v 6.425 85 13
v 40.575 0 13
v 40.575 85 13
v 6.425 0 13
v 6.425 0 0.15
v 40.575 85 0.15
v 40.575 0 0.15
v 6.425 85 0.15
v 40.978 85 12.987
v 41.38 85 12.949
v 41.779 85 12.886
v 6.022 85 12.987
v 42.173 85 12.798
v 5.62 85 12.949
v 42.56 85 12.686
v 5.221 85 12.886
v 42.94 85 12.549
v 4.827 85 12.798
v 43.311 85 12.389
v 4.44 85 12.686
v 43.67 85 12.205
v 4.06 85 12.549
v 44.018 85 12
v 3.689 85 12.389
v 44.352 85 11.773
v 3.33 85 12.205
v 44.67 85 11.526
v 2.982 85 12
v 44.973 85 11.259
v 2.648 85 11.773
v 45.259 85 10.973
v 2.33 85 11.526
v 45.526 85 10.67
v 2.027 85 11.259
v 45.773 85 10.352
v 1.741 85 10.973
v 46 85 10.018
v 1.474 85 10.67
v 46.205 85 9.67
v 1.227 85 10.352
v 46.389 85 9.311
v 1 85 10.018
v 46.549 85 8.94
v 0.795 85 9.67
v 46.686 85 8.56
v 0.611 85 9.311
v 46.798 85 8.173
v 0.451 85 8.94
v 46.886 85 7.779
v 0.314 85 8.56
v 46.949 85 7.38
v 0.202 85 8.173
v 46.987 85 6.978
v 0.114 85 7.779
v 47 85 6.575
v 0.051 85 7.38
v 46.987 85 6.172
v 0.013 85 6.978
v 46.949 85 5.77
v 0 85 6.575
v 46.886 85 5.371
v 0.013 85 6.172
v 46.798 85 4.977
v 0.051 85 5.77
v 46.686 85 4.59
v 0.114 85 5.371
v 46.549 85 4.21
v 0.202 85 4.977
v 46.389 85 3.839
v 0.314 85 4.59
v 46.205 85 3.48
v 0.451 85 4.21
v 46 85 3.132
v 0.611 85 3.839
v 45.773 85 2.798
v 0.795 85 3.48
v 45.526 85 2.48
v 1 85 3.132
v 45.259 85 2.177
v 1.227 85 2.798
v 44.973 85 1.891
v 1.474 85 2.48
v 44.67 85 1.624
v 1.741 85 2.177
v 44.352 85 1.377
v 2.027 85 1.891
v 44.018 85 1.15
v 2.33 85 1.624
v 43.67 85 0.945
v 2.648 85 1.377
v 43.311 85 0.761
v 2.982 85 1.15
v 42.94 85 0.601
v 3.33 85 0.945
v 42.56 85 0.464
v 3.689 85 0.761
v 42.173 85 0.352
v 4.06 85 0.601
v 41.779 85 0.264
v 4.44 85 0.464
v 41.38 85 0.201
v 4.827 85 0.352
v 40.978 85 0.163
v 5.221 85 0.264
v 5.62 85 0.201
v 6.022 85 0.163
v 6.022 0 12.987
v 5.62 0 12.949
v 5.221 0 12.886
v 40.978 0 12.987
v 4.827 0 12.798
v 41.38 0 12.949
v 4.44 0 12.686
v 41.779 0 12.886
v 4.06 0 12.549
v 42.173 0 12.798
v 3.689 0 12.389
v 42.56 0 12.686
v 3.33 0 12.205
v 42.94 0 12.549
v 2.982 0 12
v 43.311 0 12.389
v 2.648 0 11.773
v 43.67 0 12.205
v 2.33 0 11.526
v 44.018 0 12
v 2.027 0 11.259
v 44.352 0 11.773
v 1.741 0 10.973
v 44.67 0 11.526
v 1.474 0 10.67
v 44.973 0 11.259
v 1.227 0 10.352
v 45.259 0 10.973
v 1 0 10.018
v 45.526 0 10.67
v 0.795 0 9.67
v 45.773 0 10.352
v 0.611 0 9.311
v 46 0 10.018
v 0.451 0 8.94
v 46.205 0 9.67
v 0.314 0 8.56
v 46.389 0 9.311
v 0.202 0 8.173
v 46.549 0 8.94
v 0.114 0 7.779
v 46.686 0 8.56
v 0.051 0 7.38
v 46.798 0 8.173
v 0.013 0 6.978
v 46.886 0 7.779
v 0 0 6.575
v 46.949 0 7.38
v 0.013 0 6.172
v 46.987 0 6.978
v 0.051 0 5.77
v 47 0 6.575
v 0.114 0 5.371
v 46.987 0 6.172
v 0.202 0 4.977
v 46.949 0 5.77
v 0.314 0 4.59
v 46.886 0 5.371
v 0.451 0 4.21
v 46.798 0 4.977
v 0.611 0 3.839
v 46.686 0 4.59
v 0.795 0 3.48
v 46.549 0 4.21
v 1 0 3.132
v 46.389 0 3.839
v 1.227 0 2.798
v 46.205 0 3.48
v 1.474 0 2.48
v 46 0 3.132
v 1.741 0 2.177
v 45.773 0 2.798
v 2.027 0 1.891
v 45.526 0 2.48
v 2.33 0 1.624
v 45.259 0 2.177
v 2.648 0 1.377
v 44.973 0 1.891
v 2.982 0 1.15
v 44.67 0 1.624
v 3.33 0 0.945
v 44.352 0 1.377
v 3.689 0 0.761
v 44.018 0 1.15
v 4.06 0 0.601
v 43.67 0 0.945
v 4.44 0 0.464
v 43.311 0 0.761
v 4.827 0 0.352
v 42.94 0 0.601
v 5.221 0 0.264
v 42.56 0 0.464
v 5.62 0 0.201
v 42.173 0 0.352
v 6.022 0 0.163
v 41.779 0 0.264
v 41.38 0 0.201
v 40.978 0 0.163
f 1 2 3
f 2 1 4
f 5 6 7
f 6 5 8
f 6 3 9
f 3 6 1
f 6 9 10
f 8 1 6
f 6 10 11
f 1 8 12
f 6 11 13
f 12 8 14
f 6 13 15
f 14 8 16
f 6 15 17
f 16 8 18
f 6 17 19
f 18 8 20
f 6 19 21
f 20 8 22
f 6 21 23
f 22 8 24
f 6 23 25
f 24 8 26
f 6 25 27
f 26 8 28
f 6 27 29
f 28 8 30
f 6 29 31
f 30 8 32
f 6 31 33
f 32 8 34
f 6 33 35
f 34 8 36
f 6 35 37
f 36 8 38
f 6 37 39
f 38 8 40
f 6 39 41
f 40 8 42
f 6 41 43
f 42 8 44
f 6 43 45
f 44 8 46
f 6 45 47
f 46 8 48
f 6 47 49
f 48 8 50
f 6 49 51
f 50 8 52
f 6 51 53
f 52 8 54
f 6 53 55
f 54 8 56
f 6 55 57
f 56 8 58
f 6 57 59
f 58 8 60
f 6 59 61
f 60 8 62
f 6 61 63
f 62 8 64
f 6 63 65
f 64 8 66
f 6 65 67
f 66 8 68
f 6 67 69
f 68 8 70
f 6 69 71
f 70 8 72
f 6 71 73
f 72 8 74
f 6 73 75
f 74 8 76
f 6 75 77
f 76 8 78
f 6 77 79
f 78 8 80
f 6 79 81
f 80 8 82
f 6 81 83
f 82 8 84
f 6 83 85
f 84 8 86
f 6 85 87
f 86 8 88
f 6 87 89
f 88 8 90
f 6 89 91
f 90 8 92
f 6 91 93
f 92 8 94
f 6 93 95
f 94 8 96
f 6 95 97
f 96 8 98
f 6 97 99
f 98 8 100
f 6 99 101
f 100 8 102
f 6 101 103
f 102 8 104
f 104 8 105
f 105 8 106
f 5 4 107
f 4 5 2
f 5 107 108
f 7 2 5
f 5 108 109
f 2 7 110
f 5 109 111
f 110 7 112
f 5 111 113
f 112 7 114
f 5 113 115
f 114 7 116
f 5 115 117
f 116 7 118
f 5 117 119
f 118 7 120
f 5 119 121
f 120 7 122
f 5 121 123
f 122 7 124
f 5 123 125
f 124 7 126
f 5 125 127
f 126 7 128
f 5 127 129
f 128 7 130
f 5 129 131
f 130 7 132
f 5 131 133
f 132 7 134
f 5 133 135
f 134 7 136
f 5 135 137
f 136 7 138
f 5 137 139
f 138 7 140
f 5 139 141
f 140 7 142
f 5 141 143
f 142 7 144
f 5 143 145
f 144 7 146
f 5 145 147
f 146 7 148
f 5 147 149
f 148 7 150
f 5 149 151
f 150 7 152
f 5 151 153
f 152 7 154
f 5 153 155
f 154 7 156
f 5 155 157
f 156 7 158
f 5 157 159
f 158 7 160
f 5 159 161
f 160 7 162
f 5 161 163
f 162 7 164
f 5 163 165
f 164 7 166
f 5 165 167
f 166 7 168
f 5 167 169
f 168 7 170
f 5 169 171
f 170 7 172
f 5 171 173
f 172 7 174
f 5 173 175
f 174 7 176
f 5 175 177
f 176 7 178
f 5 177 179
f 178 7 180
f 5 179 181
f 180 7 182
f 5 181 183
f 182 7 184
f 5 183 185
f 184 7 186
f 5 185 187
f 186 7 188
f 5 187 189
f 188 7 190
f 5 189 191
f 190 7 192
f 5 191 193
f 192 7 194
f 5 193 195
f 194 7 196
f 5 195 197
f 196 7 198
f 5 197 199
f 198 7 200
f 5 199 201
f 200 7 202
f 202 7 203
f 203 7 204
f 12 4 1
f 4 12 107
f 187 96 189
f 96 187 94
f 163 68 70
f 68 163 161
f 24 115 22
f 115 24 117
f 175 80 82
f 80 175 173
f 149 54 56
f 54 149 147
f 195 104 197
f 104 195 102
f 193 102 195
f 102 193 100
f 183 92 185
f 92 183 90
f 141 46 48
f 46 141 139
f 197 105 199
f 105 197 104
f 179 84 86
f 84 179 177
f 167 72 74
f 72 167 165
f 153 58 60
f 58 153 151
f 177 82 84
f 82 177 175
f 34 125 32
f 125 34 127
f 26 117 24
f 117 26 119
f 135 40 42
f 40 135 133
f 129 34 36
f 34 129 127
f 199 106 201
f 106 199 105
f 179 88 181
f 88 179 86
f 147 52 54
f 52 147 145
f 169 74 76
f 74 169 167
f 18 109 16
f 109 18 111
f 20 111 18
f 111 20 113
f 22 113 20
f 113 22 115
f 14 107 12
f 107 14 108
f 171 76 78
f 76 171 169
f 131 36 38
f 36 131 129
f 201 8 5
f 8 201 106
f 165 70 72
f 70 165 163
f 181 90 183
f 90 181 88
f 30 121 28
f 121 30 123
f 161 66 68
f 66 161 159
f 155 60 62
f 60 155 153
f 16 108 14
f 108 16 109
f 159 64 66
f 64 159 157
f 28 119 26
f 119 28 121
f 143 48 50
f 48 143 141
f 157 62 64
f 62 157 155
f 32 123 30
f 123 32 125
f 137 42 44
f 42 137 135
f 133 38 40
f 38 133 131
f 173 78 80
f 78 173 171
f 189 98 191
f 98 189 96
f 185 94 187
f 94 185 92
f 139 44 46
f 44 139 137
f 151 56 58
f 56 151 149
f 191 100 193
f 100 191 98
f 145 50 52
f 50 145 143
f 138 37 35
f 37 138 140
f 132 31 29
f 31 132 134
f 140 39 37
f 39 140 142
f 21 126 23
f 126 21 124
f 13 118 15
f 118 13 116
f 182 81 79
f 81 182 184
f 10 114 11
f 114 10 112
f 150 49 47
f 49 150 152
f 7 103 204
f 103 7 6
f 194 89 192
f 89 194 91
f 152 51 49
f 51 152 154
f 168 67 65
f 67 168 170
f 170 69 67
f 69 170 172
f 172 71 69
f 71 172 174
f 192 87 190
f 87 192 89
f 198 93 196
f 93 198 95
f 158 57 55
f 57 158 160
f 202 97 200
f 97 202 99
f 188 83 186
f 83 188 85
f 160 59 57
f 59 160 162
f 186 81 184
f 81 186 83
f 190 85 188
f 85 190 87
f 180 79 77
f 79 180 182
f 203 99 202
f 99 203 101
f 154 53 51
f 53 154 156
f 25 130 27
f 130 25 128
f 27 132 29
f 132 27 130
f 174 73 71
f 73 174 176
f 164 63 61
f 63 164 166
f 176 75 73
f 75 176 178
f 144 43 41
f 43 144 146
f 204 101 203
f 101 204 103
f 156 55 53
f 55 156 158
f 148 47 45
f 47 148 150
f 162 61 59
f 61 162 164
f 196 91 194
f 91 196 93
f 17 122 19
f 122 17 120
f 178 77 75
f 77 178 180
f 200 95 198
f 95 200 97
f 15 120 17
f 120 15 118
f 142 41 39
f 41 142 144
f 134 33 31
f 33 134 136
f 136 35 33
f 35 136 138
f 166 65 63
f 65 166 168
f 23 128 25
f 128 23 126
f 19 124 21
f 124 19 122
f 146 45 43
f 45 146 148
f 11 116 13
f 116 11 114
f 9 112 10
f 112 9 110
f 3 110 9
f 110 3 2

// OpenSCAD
// file: ../libraries/wedge.scad
//Title: Wedge Module
//Author: Alex English - ProtoParadigm
//Date: 1/4/2013
//License: Creative Commons - Share Alike - Attribution

//Usage: Include in your other .scad projects and call wedge with arguments for the height of the wedge, the radius of the wedge, and the angle of the wedge in degrees.  The resulting wedge will be placed with the point at the origin, extending into the z axis, with the angle starting at the x axis and extending counter-clockwise as per the right-hand rule.

//Updated: 1/12/2013 - Increased dimensions of wedge to be revoved when angle is more than 180 as per suggestion from kitwallace.

module wedge_180(h, r, d)
{
	rotate(d) difference()
	{
		rotate(180-d) difference()
		{
			cylinder(h = h, r = r);
			translate([-(r+1), 0, -1]) cube([r*2+2, r+1, h+2]);
		}
		translate([-(r+1), 0, -1]) cube([r*2+2, r+1, h+2]);
	}
}

module wedge(h, r, d)
{
	if(d <= 180)
		wedge_180(h, r, d);
	else
		rotate(d) difference()
		{
			cylinder(h = h, r = r);
			translate([0, 0, -1]) wedge_180(h+2, r+1, 360-d);
		}
}

//Example: wedge(10, 20, 145); //would create a wedge 10 high, with a radius of 20, and an angle of 33 degrees.
// main file
////////////////////////////////////////////////////////////////////////
// Initial Revision:
//  2019-Jun-23
//
// Author:
//
//   David Crook <idcrook@users.noreply.github.com>
//
// Inspired by:
//
//   -
//
// Description:
//
//   Echo Auto, to be used as dimensional model:
//    https://www.amazon.com/Introducing-Echo-Auto-first-your/dp/B0753K4CWG
//
// Revisions/Notes:
//
//
////////////////////////////////////////////////////////////////////////


use <MCAD/2Dshapes.scad>
use <../libraries/wedge.scad>

e = 0.02; // small number


// Measurements, as positioned on dash mount (expressed in millimeters)
//
//  - Length 85.0 mm
//  - Depth  47.0 mm
//  - Height (shell) 12.85 mm
//  - Height (including bumpers) ~13.0-13.5 mm

ext_length = 85.0;
ext_depth = 47.0;
ext_height = 12.85;

module modelEchoAuto (length = ext_length, depth = ext_depth, height_shell = ext_height) {

  ext_height_bumper = 0.15;
  ext_height = height_shell + ext_height_bumper;
  ext_height_side_radius = (height_shell / 2);
  ext_height_side_cylinder_center_inset = ext_height_side_radius;

  depth_prism = depth - (2 * ext_height_side_cylinder_center_inset );

  difference () {
    echoAutoRoughShell(length, depth_prism, height_shell, ext_height_bumper, ext_height_side_radius);
    // TODO: top buttons
    // TODO: USB microB, aux jack
    // TODO: Front light bar
    // TODO: side slit
  }


  // TODO: bottom mount and bumber contours
  // TODO: USB microB, aux jack keepouts
}

// Rough outline of the Echo Auto
module echoAutoRoughShell (length, depth, height, height_bumpers, side_radius) {

  shellColor = "#080808A0";

   // case outer dimensions
  union () {
    // body block
    color (shellColor)
      translate([side_radius, 0, height_bumpers])
      cube([depth, length, height], center = false);

    // semicircular solid along one side
    color (shellColor)
      rotate(a = [0, 270, 270])
      translate([side_radius + height_bumpers,
                 side_radius, 0])
      linear_extrude(height = length)
    {
      circle(r=side_radius);
    }

    // semicircular solid along other side
    color (shellColor)
      rotate(a = [0, 270, 270])
      translate([side_radius + height_bumpers,
                 side_radius + depth, 0])
      linear_extrude(height = length)
    {
      circle(r=side_radius);
    }
  }

}


$fn = 100;
modelEchoAuto();
